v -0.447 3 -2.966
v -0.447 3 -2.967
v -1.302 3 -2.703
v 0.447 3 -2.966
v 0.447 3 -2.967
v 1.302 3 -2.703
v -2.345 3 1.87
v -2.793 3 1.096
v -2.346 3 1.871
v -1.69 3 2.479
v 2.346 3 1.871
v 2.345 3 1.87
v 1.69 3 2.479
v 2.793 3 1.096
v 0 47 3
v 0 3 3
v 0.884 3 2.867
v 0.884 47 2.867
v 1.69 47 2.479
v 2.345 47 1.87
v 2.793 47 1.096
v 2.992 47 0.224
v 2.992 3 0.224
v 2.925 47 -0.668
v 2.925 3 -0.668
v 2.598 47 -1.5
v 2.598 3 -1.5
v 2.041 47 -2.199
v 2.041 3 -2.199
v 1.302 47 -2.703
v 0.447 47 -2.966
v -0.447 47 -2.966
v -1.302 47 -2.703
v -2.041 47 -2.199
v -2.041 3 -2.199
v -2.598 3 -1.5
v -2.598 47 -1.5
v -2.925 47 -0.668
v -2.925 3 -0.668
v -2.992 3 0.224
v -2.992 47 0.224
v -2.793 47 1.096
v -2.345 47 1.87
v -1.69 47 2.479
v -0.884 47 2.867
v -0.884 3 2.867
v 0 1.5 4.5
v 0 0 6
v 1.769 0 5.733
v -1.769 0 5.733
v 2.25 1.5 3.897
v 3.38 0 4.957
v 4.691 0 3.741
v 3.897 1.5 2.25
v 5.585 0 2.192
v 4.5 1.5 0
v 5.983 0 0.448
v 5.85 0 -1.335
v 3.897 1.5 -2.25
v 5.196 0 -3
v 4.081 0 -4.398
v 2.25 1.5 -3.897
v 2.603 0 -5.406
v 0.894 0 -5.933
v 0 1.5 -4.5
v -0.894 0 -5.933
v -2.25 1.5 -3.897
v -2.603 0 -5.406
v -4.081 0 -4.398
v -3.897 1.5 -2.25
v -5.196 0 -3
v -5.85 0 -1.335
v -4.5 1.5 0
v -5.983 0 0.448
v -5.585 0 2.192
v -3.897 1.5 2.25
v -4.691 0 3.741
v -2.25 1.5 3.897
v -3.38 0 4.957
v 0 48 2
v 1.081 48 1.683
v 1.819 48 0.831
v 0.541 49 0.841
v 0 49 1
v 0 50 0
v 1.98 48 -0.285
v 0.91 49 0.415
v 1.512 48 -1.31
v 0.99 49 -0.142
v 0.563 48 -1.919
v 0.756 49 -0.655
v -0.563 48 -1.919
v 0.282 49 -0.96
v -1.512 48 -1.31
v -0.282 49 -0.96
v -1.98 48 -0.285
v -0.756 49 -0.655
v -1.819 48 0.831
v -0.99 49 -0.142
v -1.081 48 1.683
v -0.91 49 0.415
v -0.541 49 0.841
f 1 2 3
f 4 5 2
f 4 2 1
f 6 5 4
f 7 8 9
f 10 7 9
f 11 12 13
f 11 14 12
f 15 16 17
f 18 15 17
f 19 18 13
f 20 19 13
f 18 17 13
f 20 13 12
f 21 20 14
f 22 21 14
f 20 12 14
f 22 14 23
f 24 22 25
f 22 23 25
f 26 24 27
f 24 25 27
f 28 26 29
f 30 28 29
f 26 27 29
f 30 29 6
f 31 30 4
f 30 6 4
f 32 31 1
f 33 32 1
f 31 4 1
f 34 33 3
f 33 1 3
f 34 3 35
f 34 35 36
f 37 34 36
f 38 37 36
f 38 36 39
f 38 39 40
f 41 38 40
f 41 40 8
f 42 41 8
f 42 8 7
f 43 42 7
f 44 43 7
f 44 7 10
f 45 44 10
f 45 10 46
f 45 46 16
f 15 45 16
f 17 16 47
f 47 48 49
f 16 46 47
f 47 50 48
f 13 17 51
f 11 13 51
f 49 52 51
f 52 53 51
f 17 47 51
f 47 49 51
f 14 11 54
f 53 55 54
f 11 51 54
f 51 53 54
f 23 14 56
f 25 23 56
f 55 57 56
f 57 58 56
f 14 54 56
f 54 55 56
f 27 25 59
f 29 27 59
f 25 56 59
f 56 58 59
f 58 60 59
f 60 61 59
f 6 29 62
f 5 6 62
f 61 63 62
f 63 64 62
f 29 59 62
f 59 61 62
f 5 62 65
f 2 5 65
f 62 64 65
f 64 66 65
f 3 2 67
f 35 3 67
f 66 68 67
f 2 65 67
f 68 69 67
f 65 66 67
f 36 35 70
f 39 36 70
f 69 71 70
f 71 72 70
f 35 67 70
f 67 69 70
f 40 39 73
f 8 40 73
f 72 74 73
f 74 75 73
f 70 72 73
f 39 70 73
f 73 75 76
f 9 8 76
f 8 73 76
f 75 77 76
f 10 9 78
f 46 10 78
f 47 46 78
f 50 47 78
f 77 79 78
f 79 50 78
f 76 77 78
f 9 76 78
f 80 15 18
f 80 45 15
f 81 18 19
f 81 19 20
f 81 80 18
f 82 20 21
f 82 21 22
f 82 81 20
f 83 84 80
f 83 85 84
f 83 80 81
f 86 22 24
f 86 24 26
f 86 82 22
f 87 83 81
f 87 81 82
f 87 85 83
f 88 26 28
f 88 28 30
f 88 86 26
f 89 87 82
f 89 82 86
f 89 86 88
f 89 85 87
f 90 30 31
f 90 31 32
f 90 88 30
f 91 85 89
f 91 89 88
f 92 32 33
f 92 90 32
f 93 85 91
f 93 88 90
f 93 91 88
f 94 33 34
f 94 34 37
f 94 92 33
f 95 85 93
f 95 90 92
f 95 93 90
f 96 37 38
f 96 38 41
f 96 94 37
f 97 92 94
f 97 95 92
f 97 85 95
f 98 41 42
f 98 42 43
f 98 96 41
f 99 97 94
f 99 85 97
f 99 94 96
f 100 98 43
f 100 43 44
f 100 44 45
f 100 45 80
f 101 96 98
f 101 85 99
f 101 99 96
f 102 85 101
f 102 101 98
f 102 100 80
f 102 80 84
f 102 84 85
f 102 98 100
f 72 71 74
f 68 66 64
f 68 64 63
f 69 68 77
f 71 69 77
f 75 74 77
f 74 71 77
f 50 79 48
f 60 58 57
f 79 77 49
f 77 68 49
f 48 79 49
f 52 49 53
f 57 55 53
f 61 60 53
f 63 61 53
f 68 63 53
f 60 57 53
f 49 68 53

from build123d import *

# Parameters (mm, degrees)
SKETCH1_R           = 6
SKETCH1_R_2         = 3
BOSS_EXTRUDE1_DEPTH = 3
SKETCH1_2_R         = 3
BOSS_EXTRUDE2_DEPTH = 50
CHAMFER1_SIZE       = 3


with BuildPart() as part:
    # Sketch1 → Boss-Extrude1 (new body)
    with BuildSketch(Plane(origin=(0, 0, 0), x_dir=(1, 0, 0), z_dir=(0, 1, 0))):
        with Locations(Location((0, 0, 0), (0, 0, 270))):
            Circle(SKETCH1_R)
        with Locations(Location((0, 0, 0), (0, 0, 270))):
            Circle(SKETCH1_R_2, mode=Mode.SUBTRACT)
    extrude(amount=BOSS_EXTRUDE1_DEPTH)

    # Sketch1<2> → Boss-Extrude2 (add)
    with BuildSketch(Plane(origin=(0, 0, 0), x_dir=(1, 0, 0), z_dir=(0, 1, 0))):
        with Locations(Location((0, 0, 0), (0, 0, 270))):
            Circle(SKETCH1_2_R)
    extrude(amount=BOSS_EXTRUDE2_DEPTH)

    # Chamfer1
    chamfer1_edges = [part.edges().sort_by_distance(p)[0] for p in [
        (0, 50, -3),
        (0, 3, -6),
    ]]
    chamfer(chamfer1_edges, length=CHAMFER1_SIZE - 0.0001)  # a hair under: the kernel refuses the full size


solid = part.part
